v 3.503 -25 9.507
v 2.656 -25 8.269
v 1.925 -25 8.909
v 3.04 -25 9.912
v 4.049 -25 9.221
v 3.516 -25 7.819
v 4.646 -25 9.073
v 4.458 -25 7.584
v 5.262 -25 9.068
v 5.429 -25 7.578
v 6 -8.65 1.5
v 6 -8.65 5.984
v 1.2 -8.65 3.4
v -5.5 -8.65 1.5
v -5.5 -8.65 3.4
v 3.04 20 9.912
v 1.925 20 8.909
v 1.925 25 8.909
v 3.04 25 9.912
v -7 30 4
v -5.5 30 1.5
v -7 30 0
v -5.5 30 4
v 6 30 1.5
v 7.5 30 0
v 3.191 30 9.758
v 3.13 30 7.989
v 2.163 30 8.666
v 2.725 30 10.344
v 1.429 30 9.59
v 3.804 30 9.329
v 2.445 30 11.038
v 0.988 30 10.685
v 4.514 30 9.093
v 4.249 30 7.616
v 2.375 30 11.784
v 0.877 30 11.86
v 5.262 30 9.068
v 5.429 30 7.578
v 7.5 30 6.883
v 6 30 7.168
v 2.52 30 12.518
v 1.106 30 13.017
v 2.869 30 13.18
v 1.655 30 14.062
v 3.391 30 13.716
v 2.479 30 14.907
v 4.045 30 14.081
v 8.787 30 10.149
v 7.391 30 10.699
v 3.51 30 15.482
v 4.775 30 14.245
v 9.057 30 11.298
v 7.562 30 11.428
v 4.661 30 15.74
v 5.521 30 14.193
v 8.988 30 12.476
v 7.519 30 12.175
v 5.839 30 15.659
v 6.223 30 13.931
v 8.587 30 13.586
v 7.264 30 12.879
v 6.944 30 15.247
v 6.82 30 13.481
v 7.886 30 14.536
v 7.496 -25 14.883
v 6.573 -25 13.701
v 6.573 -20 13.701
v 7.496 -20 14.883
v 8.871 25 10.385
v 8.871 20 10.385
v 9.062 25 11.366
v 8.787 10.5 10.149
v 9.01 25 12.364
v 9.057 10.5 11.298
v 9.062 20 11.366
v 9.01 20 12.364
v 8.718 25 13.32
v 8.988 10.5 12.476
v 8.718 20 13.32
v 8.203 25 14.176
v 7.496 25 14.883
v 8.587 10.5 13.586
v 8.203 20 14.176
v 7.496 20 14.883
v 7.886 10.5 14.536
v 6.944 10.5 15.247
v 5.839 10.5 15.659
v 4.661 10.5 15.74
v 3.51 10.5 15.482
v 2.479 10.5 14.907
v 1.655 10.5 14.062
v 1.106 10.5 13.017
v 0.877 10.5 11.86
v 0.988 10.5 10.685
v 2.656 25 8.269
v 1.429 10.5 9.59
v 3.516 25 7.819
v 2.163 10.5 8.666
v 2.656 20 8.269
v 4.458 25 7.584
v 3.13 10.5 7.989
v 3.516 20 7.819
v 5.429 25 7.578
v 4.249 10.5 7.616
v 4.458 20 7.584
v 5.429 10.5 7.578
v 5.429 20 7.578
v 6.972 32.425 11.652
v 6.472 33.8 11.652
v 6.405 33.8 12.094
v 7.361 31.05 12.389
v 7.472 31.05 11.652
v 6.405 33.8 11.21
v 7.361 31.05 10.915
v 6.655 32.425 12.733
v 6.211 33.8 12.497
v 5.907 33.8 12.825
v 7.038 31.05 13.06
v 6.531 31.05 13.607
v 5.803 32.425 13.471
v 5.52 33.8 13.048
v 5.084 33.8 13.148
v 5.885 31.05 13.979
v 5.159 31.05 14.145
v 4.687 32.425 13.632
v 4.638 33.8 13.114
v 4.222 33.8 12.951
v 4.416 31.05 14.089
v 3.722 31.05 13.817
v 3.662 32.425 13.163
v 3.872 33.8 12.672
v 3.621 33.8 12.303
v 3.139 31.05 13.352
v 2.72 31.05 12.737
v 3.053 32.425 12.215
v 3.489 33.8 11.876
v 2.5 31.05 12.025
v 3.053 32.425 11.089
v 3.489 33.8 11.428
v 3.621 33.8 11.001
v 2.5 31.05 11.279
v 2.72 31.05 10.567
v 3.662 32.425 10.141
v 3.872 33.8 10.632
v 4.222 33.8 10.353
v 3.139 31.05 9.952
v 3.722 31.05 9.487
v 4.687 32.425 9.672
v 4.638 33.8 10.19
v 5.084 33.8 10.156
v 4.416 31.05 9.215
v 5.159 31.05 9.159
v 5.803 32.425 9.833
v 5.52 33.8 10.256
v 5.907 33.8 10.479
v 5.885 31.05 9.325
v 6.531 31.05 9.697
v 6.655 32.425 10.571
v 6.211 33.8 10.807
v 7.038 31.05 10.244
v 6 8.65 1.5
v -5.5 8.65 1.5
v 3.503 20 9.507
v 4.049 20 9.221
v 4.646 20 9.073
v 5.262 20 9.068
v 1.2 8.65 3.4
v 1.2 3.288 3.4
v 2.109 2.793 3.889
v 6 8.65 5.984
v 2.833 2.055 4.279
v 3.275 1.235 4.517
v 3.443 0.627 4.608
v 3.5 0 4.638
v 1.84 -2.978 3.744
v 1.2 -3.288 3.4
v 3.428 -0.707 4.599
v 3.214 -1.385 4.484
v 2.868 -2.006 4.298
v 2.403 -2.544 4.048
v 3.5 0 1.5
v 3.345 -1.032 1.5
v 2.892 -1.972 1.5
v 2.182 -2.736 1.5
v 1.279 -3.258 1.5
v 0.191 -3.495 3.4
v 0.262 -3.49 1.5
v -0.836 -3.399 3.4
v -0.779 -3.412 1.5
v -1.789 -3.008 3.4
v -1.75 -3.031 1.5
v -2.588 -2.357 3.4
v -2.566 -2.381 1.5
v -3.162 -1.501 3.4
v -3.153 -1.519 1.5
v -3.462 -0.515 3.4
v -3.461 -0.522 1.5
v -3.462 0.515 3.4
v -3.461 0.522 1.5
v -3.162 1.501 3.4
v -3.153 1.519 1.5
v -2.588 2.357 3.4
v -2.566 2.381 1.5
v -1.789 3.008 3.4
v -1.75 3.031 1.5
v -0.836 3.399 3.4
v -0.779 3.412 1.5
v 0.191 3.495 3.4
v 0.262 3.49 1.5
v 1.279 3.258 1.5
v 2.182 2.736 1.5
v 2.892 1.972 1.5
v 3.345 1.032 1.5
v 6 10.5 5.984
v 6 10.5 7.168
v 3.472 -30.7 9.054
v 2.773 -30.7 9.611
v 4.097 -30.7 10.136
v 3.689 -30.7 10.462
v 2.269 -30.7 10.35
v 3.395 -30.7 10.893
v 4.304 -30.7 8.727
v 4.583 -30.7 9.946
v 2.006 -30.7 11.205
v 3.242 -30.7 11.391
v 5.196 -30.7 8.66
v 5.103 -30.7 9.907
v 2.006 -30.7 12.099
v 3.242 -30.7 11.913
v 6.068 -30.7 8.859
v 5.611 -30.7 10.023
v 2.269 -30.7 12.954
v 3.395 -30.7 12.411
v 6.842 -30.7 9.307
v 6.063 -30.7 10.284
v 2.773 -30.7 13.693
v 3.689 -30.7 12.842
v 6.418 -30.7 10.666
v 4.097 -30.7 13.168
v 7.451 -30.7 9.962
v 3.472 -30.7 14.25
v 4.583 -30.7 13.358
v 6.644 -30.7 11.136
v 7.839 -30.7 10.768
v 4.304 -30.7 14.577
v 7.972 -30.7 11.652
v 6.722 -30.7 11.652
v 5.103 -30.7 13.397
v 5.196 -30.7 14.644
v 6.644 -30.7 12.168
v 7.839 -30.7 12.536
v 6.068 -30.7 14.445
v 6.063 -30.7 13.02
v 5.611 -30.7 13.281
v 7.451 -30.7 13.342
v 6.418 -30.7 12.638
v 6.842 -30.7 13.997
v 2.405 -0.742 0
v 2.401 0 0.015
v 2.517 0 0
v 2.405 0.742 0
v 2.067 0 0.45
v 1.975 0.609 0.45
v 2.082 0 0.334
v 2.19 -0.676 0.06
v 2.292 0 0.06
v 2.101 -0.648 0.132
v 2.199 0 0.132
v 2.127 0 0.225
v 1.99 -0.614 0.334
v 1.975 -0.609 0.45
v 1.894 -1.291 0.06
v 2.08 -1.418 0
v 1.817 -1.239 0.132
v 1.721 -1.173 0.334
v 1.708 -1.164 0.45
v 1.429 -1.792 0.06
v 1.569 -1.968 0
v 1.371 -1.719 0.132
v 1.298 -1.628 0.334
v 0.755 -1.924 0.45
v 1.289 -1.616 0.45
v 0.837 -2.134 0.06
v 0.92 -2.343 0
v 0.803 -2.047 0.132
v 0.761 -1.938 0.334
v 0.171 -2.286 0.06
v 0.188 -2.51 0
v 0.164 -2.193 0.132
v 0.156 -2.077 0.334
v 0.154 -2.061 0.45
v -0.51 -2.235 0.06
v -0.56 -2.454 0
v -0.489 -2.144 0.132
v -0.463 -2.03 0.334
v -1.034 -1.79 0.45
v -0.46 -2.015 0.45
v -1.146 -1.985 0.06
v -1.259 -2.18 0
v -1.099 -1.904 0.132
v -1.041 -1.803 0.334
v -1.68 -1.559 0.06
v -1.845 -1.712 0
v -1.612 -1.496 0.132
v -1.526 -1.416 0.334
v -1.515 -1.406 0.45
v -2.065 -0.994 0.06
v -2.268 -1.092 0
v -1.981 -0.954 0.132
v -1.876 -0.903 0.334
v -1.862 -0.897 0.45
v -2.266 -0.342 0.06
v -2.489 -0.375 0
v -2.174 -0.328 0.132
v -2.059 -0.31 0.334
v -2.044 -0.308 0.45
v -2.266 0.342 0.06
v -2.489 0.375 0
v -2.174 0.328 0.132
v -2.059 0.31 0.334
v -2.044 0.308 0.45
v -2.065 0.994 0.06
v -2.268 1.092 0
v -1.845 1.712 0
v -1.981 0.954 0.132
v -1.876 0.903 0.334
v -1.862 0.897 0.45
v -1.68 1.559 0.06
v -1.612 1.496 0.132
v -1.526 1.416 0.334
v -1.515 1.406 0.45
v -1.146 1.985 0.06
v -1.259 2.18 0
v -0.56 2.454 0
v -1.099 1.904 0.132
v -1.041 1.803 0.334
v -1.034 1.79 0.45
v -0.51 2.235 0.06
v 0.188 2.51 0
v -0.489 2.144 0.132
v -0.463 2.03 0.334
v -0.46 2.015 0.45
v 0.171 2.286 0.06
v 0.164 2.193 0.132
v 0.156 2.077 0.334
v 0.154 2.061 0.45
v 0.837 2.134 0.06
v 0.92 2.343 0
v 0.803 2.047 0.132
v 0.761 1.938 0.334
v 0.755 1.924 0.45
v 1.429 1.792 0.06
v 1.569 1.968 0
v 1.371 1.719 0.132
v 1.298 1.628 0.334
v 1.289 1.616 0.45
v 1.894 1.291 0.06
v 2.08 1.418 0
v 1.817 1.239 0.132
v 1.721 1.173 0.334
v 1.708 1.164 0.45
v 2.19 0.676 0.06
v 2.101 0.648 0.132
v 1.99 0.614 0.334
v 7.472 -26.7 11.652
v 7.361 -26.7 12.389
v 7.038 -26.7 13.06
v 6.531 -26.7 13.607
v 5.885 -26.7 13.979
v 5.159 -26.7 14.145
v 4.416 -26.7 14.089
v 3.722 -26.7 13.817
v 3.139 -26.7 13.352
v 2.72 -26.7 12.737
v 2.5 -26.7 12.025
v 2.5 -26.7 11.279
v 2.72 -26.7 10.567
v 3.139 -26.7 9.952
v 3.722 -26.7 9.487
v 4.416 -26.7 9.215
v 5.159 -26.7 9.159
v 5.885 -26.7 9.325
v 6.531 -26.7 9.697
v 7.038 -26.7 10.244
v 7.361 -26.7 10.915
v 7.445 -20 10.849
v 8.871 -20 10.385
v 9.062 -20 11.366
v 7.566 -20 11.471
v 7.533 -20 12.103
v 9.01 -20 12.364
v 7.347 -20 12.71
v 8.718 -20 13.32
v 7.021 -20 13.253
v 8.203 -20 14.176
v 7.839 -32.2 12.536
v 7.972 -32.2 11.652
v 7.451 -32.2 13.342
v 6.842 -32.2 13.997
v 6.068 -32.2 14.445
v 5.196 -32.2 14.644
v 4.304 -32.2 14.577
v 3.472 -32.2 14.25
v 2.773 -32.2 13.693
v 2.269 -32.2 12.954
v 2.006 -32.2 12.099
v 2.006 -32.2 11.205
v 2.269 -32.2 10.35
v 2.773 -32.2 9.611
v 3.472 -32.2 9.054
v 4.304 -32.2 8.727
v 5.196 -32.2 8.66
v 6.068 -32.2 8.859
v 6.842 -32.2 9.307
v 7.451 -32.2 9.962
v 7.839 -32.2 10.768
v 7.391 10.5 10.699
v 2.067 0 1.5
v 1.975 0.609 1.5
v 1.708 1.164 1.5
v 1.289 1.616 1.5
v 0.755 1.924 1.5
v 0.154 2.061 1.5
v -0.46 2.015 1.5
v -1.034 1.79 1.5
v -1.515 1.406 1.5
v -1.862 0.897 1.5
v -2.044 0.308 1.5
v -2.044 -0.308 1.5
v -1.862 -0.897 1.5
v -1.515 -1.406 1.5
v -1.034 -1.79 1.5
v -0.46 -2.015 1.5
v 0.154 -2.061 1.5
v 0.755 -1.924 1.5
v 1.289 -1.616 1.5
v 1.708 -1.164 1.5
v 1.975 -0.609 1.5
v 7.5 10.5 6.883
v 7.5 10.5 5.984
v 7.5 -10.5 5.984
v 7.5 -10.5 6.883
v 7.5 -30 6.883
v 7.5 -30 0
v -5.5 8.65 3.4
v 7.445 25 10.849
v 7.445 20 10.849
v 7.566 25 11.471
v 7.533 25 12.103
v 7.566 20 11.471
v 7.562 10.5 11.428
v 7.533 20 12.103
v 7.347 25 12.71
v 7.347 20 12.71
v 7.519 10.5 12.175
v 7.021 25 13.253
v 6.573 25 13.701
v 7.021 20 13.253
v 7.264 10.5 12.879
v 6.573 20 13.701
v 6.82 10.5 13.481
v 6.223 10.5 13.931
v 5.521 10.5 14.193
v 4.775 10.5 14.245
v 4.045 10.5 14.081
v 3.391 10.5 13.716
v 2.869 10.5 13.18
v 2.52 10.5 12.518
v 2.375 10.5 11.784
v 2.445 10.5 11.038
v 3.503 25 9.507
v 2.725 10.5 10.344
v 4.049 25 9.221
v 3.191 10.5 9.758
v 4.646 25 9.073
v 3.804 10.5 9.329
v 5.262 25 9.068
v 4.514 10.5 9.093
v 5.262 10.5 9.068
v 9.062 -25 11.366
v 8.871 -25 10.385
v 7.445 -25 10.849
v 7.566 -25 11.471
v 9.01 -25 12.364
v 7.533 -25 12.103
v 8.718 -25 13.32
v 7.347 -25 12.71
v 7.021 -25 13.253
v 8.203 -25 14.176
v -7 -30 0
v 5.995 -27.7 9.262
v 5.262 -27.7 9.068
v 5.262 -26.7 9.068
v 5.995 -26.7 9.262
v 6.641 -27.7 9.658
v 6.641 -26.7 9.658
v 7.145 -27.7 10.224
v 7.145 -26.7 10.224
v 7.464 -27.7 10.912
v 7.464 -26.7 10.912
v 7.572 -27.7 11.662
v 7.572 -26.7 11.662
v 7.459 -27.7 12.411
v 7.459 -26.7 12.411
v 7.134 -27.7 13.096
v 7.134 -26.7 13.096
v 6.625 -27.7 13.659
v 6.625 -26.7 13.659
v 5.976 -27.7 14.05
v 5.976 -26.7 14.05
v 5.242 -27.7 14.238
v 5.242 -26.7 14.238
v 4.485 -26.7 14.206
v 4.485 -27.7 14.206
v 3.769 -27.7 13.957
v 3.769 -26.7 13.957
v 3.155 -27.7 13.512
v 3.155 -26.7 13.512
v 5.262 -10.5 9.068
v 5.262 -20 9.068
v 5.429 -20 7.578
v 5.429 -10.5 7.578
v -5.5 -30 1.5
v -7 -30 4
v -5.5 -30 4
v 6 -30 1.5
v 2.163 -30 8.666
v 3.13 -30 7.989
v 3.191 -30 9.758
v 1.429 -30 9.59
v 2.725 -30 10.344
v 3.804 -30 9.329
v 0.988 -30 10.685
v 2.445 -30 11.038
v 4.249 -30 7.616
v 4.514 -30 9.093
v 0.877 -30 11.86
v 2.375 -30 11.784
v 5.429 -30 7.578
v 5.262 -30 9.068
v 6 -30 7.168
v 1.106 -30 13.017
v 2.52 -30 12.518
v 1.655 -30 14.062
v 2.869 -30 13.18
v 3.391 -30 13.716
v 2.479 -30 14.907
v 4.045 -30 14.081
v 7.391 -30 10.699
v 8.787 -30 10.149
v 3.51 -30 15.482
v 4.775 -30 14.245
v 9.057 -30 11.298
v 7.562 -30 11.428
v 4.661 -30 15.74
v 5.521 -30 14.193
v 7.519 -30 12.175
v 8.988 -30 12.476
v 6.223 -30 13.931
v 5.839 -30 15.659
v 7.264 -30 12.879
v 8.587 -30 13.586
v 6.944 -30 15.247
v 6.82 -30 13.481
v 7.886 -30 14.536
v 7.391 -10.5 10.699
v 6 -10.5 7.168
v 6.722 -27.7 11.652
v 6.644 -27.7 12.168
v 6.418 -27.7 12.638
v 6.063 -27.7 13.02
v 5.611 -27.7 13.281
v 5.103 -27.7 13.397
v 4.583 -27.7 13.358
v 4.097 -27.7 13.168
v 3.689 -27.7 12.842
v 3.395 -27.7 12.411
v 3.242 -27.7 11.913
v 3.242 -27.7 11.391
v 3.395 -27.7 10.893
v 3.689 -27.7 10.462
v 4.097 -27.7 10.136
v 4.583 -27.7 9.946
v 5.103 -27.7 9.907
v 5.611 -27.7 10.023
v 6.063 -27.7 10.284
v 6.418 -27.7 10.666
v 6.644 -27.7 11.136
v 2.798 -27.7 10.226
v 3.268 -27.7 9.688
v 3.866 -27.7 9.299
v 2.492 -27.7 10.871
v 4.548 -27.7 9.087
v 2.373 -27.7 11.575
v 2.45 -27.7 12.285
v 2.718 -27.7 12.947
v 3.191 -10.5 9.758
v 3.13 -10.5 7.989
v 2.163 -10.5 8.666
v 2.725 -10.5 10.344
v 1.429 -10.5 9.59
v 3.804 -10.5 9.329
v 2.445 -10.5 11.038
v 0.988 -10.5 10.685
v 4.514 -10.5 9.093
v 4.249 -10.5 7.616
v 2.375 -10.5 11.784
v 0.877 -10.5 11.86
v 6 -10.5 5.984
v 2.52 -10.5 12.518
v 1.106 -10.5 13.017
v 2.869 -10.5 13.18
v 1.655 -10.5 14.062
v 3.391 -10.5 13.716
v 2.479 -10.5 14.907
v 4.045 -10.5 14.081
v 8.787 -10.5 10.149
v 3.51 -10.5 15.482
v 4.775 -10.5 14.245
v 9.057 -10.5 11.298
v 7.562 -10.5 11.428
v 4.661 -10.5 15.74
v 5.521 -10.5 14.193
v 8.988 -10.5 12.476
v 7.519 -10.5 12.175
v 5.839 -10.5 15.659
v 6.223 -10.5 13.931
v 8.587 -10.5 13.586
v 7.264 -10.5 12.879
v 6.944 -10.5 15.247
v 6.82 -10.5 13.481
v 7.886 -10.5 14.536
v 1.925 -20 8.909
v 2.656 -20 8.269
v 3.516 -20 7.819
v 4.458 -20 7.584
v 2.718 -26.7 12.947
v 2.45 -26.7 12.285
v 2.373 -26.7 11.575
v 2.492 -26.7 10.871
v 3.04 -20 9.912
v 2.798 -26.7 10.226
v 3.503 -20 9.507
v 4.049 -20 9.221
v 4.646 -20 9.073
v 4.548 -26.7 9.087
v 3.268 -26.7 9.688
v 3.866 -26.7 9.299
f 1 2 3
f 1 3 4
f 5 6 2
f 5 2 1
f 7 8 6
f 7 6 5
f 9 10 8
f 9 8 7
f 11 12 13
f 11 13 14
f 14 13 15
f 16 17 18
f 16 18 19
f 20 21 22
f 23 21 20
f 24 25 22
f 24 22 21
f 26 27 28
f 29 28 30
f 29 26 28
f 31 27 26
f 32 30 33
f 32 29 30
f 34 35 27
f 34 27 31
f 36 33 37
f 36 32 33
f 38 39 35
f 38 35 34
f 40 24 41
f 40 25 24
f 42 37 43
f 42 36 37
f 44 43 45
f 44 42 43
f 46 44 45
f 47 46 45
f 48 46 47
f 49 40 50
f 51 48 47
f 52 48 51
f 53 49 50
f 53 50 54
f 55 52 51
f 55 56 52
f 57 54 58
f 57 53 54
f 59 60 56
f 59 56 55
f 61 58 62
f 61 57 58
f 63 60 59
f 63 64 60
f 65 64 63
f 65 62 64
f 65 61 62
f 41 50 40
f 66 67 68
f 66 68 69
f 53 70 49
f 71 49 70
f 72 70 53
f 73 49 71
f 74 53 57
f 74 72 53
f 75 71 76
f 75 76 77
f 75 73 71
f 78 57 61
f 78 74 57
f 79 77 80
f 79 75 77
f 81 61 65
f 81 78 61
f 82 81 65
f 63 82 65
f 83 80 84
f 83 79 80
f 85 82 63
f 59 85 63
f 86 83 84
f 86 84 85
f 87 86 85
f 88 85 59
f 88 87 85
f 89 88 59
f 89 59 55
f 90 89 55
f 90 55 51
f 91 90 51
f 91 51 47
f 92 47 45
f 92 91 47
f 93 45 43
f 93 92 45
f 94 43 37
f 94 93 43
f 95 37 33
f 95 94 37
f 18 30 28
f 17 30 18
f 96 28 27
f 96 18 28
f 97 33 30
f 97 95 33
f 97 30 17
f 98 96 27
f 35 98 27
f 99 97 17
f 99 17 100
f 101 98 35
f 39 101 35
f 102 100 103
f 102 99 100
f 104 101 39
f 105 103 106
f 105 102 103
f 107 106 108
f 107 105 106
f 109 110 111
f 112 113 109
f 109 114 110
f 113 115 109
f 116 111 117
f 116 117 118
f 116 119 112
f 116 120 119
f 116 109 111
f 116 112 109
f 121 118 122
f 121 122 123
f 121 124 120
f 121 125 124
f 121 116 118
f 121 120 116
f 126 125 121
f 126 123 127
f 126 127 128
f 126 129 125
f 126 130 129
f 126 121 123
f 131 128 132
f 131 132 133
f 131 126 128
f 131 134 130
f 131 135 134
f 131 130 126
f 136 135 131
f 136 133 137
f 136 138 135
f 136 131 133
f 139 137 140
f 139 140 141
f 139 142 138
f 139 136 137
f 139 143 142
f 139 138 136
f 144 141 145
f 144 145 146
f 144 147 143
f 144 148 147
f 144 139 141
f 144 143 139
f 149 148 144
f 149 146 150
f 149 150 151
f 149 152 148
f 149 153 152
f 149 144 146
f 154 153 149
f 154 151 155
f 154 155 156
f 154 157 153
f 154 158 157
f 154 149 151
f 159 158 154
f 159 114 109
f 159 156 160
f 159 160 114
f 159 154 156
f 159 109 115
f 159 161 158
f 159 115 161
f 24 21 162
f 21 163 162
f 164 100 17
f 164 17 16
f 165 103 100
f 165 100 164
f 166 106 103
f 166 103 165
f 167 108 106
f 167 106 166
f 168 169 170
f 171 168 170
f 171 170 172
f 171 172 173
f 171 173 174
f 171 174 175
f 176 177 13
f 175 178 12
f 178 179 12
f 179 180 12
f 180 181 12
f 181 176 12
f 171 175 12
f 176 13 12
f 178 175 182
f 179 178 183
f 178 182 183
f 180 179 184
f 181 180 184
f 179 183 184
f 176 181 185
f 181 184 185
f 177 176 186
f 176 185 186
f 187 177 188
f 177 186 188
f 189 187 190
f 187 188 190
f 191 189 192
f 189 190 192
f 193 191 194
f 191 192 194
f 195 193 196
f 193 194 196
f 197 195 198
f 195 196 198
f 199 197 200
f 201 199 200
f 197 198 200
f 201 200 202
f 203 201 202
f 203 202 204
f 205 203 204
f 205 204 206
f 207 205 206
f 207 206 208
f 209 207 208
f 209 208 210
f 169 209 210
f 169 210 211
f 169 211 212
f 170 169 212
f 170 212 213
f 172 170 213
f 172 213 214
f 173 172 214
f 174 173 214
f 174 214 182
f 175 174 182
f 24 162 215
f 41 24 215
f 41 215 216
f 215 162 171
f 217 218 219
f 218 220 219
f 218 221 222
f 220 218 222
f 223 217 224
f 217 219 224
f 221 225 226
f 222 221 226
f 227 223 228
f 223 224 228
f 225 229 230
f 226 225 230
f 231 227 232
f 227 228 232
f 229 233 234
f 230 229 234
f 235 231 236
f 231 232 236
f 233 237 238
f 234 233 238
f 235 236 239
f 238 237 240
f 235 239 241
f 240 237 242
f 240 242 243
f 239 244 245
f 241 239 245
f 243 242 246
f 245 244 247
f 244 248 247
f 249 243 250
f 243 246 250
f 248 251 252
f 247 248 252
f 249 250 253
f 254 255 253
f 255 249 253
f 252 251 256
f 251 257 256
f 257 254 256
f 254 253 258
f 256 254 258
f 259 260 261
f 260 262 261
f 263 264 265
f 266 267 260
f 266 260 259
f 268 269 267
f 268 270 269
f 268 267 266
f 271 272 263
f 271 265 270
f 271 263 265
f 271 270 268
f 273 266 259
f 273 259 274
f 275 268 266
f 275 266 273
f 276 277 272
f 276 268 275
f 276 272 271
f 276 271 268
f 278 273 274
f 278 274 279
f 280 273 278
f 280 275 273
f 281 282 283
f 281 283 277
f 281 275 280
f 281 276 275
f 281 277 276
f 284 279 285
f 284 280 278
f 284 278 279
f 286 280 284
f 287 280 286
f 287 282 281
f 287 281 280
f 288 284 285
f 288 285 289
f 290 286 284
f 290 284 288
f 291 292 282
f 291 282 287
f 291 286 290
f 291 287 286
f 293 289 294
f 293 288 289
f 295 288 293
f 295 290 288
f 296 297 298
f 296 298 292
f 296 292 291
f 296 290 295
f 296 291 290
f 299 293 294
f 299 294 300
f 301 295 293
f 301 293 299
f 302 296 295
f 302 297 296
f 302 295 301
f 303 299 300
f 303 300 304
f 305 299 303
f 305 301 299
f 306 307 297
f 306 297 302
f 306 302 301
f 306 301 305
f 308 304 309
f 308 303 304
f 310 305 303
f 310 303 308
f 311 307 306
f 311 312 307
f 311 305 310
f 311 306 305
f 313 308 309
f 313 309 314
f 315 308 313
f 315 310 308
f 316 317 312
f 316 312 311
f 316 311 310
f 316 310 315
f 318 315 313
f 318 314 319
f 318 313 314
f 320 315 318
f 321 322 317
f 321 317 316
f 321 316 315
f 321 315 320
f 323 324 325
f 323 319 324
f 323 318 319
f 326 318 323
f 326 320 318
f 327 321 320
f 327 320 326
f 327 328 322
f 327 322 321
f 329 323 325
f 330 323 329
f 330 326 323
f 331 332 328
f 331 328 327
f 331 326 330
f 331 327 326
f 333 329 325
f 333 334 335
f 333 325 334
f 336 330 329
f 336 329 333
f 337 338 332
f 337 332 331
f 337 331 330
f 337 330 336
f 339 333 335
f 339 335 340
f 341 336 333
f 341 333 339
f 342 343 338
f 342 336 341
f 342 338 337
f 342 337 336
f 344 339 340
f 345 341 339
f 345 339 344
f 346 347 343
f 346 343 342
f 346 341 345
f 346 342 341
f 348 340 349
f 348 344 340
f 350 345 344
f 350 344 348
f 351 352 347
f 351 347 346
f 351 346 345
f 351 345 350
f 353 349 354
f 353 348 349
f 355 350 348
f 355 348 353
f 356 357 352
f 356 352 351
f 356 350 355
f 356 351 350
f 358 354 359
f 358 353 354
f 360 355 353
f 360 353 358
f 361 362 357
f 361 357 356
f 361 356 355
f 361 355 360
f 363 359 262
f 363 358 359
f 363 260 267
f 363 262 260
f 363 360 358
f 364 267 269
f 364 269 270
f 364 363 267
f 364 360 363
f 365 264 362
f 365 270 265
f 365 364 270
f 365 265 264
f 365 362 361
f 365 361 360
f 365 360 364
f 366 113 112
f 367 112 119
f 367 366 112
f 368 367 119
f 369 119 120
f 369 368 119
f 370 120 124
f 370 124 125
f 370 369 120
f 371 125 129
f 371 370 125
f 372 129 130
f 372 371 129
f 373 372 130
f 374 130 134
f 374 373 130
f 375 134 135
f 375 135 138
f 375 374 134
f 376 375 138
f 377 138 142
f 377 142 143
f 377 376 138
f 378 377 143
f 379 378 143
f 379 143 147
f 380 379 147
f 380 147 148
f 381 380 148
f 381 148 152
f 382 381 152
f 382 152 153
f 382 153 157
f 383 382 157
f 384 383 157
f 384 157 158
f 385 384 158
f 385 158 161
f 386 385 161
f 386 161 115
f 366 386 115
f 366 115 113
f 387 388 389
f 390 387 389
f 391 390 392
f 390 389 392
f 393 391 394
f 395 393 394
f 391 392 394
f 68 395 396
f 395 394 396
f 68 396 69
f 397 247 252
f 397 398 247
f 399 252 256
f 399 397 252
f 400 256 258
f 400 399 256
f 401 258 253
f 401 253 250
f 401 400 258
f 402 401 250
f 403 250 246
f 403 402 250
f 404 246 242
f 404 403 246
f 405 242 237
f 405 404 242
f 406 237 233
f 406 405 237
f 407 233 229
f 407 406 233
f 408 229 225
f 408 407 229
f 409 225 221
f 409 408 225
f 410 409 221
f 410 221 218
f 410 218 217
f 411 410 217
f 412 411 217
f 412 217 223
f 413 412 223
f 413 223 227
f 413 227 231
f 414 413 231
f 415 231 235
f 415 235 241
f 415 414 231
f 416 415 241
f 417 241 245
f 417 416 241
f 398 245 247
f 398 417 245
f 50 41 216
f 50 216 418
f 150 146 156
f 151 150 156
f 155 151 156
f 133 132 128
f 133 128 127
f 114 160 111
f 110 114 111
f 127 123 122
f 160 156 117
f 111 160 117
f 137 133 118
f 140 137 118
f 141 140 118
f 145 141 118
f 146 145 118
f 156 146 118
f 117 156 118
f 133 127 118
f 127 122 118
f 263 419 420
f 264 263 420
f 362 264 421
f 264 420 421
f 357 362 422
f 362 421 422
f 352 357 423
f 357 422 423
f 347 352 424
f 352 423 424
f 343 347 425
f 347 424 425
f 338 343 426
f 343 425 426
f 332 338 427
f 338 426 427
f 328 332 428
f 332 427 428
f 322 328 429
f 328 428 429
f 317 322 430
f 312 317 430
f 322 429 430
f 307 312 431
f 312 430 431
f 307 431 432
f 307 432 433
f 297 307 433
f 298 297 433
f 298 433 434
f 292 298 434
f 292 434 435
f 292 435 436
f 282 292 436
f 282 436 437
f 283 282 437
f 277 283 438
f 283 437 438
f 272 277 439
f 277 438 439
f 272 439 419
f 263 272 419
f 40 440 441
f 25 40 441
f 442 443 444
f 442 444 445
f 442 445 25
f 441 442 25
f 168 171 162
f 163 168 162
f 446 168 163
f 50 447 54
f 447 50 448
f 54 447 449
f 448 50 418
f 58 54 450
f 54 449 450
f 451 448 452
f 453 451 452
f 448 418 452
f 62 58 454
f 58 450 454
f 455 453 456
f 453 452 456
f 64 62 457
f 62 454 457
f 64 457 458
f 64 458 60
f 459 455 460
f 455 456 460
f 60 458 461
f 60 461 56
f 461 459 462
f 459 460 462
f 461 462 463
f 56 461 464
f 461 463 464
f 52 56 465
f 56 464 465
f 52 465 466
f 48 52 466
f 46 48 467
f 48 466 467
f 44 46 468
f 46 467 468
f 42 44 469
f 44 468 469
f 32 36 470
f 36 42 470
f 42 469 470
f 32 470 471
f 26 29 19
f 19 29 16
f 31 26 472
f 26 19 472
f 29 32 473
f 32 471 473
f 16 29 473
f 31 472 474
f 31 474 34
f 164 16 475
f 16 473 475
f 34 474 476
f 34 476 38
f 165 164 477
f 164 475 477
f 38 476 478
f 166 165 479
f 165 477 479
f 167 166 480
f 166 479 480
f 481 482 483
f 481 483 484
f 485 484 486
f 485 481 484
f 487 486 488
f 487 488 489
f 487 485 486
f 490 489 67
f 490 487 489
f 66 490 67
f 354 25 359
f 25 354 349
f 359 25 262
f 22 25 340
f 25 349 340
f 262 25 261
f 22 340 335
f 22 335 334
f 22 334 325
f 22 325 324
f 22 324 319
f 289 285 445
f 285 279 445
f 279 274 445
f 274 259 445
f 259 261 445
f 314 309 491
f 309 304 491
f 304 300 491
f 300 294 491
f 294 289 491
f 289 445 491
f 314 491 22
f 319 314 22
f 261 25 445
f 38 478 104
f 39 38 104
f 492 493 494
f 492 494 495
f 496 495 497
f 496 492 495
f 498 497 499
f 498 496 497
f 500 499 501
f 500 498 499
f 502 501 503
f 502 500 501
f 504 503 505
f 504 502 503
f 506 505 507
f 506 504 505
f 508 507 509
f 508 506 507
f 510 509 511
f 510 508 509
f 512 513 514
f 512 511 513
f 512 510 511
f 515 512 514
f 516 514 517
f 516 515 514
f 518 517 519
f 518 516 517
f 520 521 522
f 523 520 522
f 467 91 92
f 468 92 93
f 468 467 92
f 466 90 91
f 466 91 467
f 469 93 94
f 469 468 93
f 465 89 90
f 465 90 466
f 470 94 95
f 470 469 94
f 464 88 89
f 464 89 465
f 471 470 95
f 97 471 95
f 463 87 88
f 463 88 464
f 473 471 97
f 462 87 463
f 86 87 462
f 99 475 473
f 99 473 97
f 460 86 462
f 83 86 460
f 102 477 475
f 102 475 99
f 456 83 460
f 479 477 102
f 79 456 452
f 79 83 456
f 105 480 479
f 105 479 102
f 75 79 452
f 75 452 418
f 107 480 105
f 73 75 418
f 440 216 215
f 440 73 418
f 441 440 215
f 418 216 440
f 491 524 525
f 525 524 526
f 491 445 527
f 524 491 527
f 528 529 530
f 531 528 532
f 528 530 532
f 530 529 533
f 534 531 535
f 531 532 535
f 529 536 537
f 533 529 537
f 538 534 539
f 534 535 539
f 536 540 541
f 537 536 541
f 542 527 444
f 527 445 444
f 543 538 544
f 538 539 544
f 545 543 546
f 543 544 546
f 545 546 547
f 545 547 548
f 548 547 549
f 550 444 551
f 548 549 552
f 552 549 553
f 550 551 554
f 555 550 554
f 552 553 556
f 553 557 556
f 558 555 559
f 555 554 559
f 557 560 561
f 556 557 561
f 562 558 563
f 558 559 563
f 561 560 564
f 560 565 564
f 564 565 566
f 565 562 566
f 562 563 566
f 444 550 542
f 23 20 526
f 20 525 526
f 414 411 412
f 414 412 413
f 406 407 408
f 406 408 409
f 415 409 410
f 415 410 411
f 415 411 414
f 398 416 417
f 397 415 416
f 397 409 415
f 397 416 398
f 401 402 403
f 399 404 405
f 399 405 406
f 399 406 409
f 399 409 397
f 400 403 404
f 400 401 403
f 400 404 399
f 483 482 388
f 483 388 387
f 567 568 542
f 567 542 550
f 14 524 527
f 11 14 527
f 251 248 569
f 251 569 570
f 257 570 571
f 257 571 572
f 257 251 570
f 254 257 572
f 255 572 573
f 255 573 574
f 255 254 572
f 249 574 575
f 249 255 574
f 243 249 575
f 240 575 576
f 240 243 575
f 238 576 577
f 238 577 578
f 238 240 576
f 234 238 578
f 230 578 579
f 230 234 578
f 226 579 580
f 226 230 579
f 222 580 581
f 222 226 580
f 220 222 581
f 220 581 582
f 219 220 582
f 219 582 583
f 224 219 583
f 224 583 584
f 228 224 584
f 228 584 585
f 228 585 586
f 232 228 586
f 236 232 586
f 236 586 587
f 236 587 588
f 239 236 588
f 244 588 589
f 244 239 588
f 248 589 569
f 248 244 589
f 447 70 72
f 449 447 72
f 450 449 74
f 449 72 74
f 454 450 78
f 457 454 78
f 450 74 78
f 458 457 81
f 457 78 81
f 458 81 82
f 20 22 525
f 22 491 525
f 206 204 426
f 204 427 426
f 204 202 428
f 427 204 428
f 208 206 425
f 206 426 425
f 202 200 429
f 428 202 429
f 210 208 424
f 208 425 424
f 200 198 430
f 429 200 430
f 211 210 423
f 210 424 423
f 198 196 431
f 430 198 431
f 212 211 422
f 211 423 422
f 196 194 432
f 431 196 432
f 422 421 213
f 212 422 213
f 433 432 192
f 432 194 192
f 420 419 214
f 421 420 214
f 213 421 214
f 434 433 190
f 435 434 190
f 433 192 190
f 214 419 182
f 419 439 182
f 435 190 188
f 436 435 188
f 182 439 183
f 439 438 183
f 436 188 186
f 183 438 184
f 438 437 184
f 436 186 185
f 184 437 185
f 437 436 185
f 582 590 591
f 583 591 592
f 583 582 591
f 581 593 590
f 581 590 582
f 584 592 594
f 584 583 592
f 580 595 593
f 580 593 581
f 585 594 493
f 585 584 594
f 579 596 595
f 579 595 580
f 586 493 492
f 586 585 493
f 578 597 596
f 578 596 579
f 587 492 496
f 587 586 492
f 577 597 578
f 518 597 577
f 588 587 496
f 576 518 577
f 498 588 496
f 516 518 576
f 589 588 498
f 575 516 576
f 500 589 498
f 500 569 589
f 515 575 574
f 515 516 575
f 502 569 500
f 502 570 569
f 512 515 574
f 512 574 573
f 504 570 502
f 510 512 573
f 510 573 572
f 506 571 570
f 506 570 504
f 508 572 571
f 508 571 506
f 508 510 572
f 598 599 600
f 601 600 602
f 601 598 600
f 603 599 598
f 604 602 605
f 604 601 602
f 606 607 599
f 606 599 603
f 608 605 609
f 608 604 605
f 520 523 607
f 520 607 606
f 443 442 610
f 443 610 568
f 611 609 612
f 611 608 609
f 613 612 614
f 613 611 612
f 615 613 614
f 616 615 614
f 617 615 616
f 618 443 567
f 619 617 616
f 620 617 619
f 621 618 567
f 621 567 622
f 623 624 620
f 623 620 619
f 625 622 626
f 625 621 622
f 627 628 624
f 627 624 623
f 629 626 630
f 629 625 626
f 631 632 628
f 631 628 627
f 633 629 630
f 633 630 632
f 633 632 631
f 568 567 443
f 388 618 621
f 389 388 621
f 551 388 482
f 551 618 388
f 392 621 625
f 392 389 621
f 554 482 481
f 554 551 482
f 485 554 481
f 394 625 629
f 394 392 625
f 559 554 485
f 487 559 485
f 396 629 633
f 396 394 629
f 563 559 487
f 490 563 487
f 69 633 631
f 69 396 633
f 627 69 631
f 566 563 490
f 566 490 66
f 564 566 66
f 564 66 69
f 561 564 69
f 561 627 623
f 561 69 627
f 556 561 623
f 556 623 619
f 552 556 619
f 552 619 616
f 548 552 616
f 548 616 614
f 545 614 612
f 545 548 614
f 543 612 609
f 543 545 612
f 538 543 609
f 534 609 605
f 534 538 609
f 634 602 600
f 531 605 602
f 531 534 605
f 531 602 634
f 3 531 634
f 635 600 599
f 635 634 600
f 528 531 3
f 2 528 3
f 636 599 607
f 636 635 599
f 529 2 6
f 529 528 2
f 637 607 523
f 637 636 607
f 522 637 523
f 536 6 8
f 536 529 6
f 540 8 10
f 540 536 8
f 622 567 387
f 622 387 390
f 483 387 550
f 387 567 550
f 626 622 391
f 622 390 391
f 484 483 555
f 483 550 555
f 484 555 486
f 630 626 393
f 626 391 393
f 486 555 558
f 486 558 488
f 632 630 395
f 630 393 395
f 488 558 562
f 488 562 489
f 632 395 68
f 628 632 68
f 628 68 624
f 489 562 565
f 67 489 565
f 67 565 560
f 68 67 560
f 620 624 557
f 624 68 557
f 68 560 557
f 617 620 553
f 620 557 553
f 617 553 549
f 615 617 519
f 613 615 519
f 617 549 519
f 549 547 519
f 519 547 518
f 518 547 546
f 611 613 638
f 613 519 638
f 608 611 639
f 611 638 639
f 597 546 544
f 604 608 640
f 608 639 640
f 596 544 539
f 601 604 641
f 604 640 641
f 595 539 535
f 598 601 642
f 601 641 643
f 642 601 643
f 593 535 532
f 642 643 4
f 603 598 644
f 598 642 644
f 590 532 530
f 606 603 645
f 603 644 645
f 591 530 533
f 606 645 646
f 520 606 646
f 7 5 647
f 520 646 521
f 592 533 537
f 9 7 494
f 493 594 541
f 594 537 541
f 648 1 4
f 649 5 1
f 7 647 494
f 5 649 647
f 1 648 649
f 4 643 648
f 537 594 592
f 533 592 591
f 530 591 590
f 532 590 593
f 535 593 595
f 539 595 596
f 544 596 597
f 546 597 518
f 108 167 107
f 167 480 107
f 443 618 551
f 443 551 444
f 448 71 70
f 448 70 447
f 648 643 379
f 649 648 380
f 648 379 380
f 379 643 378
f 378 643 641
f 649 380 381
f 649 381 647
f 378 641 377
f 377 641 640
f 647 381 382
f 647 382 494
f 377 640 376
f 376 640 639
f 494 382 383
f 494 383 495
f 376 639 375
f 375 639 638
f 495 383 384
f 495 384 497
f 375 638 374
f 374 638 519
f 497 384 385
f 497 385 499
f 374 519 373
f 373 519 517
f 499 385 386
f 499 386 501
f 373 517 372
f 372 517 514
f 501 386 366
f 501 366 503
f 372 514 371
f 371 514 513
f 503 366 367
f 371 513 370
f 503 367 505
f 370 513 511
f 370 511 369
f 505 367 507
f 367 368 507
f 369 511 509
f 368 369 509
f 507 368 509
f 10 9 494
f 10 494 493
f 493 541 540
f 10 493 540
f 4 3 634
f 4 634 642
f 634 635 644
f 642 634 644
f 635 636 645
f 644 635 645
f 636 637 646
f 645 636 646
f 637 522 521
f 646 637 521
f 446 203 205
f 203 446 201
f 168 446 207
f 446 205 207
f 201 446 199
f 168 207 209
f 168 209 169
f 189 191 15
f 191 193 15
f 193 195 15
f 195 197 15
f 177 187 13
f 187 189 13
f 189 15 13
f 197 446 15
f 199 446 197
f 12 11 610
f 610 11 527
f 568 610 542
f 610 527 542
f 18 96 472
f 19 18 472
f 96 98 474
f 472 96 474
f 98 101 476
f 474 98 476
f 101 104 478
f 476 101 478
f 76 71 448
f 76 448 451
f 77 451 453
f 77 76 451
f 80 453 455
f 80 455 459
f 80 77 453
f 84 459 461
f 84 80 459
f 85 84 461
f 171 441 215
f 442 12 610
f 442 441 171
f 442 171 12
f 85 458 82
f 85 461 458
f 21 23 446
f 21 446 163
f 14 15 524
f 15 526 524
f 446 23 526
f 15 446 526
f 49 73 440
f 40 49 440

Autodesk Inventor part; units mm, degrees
sketch "Sketch_12" plane through (0, 0, 0) normal (0, 1, 0) x (-1, 0, 0)
  line L0 (5.5, 3.4) -> (-1.2, 3.4)
  line L1 (-1.2, 3.4) -> (-6, 5.984)
  line L2 (-6, 5.984) -> (-6, 1.5)
  line L3 (-6, 1.5) -> (5.5, 1.5)
  line L4 (5.5, 1.5) -> (5.5, 3.4)
extrude "Extrusion1" add sketch "Sketch_12" along normal mid plane 17.3
sketch "Sketch_16" plane through (0, 0, 0) normal (0, 0, 1) x (1, 0, 0)
  circle A0 centre (0, 0) radius 3.5
extrude "Extrusion2" cut sketch "Sketch_16" along normal blind 6
sketch "Sketch_1" plane through (0, 0, 0) normal (0, 1, 0) x (0, 0, 1)
  line L0 (0, 7.5) -> (0, -7)
  line L1 (0, -7) -> (4, -7)
  line L2 (4, -7) -> (4, -5.5)
  line L3 (4, -5.5) -> (1.5, -5.5)
  line L4 (1.5, -5.5) -> (1.5, 6)
  line L5 (1.5, 6) -> (7.1676, 6)
  line L6 (7.1676, 6) -> (10.6991, 7.3911)
  arc A0 (9.0682, 5.2618) -> (10.6991, 7.3911) centre (11.652, 4.972) ccw
  line L7 (9.0682, 5.2618) -> (7.5776, 5.429)
  arc A1 (7.5776, 5.429) -> (10.1493, 8.7867) centre (11.652, 4.972) ccw
  line L8 (10.1493, 8.7867) -> (6.8828, 7.5)
  line L9 (6.8828, 7.5) -> (0, 7.5)
extrude "Extrusion3" add sketch "Sketch_1" along normal mid plane 60
sketch "Sketch_8" plane through (0, 22.5, 0) normal (0, 1, 0) x (0, 0, 1)
  arc A0 (7.1855, 5.5204) -> (8.6409, 1.6278) centre (11.652, 4.972) ccw
  line L0 (8.6409, 1.6278) -> (9.9792, 3.1141)
  arc A1 (9.9792, 3.1141) -> (13.622, 6.5112) centre (11.652, 4.972) ccw
  line L1 (13.622, 6.5112) -> (15.198, 7.7425)
  arc A2 (15.198, 7.7425) -> (10.2614, 9.2518) centre (11.652, 4.972) ccw
  line L2 (10.2614, 9.2518) -> (10.8795, 7.3496)
  arc A3 (10.8795, 7.3496) -> (9.1706, 5.2767) centre (11.652, 4.972) ccw
  line L3 (9.1706, 5.2767) -> (7.1855, 5.5204)
extrude "Extrusion4" cut sketch "Sketch_8" along normal mid plane 5
sketch "Sketch_9" plane through (0, -22.5, 0) normal (0, 1, 0) x (0, 0, 1)
  arc A0 (7.1855, 5.5204) -> (8.6409, 1.6278) centre (11.652, 4.972) ccw
  line L0 (8.6409, 1.6278) -> (9.9792, 3.1141)
  arc A1 (9.9792, 3.1141) -> (13.622, 6.5112) centre (11.652, 4.972) ccw
  line L1 (13.622, 6.5112) -> (15.198, 7.7425)
  arc A2 (15.198, 7.7425) -> (10.2614, 9.2518) centre (11.652, 4.972) ccw
  line L2 (10.2614, 9.2518) -> (10.8795, 7.3496)
  arc A3 (10.8795, 7.3496) -> (9.1706, 5.2767) centre (11.652, 4.972) ccw
  line L3 (9.1706, 5.2767) -> (7.1855, 5.5204)
extrude "Extrusion5" cut sketch "Sketch_9" along normal mid plane 5
sketch "Sketch_5" plane through (0, 0, 0) normal (0, 1, 0) x (0, 0, 1)
  line L0 (1.5, 0) -> (0, 0)
  line L1 (0, 0) -> (0, 2.517)
  arc A0 (0, 2.517) -> (0.45, 2.067) centre (0.45, 2.517) ccw
  line L2 (0.45, 2.067) -> (1.5, 2.067)
  line L3 (1.5, 2.067) -> (1.5, 0)
  line L4 (1.5, 0) -> (0, 0)
revolve "Revolution1" cut sketch "Sketch_5" angle 360 about axis through (0, 0, 1.5) along (0, 0, 1)
thread "Thread1" size "M5x0.8" class "6H" standard "ISO Metric profile" full length
sketch "Sketch_6" plane through (7.5, 0, 0) normal (-1, 0, 0) x (0, 0, 1)
  line L0 (5.984, -10.5) -> (15.984, -10.5)
  line L1 (15.984, -10.5) -> (15.984, 10.5)
  line L2 (15.984, 10.5) -> (5.984, 10.5)
  line L3 (5.984, 10.5) -> (5.984, -10.5)
extrude "Extrusion6" cut sketch "Sketch_6" along normal mid plane 14
sketch "Sketch_7" plane through (0, 0, 11.652) normal (0, 0, 1) x (1, 0, 0)
  line L0 (4.972, -32.2) -> (4.972, 33.8)
  line L1 (4.972, 33.8) -> (6.472, 33.8)
  line L2 (6.472, 33.8) -> (7.472, 31.05)
  line L3 (7.472, 31.05) -> (7.472, -26.7)
  line L4 (7.472, -26.7) -> (7.572, -26.7)
  line L5 (7.572, -26.7) -> (7.572, -27.7)
  line L6 (7.572, -27.7) -> (6.722, -27.7)
  line L7 (6.722, -27.7) -> (6.722, -30.7)
  line L8 (6.722, -30.7) -> (7.972, -30.7)
  line L9 (7.972, -30.7) -> (7.972, -32.2)
  line L10 (7.972, -32.2) -> (4.972, -32.2)
  line L11 (4.972, -32.2) -> (4.972, 33.8)
revolve "Revolution2" add sketch "Sketch_7" angle 360 about axis through (4.972, -32.2, 11.652) along (0, -1, 0)
ref_plane "SC_XY" through (0, 0, 0) normal (0, 0, 1) x (-1, 0, 0)
ref_plane "SC_YZ" through (0, 0, 0) normal (-1, 0, 0) x (0, -1, 0)
ref_plane "SC_ZX" through (0, 0, 0) normal (0, -1, 0) x (0, 0, 1)
ref_plane "TUER1_XY" through (4.972, 0, 11.652) normal (0, -1, 0) x (0, 0, 1)
ref_plane "TUER1_YZ" through (4.972, 0, 11.652) normal (0, 0, 1) x (-1, 0, 0)
ref_plane "TUER1_ZX" through (4.972, 0, 11.652) normal (-1, 0, 0) x (0, -1, 0)
ref_plane "TUER2_XY" through (4.972, 0, 11.652) normal (0, 1, 0) x (0, 0, 1)
ref_plane "TUER2_YZ" through (4.972, 0, 11.652) normal (0, 0, 1) x (1, 0, 0)
ref_plane "TUER2_ZX" through (4.972, 0, 11.652) normal (1, 0, 0) x (0, 1, 0)
properties part number "1XXX_01_04(T,2)_P7"
